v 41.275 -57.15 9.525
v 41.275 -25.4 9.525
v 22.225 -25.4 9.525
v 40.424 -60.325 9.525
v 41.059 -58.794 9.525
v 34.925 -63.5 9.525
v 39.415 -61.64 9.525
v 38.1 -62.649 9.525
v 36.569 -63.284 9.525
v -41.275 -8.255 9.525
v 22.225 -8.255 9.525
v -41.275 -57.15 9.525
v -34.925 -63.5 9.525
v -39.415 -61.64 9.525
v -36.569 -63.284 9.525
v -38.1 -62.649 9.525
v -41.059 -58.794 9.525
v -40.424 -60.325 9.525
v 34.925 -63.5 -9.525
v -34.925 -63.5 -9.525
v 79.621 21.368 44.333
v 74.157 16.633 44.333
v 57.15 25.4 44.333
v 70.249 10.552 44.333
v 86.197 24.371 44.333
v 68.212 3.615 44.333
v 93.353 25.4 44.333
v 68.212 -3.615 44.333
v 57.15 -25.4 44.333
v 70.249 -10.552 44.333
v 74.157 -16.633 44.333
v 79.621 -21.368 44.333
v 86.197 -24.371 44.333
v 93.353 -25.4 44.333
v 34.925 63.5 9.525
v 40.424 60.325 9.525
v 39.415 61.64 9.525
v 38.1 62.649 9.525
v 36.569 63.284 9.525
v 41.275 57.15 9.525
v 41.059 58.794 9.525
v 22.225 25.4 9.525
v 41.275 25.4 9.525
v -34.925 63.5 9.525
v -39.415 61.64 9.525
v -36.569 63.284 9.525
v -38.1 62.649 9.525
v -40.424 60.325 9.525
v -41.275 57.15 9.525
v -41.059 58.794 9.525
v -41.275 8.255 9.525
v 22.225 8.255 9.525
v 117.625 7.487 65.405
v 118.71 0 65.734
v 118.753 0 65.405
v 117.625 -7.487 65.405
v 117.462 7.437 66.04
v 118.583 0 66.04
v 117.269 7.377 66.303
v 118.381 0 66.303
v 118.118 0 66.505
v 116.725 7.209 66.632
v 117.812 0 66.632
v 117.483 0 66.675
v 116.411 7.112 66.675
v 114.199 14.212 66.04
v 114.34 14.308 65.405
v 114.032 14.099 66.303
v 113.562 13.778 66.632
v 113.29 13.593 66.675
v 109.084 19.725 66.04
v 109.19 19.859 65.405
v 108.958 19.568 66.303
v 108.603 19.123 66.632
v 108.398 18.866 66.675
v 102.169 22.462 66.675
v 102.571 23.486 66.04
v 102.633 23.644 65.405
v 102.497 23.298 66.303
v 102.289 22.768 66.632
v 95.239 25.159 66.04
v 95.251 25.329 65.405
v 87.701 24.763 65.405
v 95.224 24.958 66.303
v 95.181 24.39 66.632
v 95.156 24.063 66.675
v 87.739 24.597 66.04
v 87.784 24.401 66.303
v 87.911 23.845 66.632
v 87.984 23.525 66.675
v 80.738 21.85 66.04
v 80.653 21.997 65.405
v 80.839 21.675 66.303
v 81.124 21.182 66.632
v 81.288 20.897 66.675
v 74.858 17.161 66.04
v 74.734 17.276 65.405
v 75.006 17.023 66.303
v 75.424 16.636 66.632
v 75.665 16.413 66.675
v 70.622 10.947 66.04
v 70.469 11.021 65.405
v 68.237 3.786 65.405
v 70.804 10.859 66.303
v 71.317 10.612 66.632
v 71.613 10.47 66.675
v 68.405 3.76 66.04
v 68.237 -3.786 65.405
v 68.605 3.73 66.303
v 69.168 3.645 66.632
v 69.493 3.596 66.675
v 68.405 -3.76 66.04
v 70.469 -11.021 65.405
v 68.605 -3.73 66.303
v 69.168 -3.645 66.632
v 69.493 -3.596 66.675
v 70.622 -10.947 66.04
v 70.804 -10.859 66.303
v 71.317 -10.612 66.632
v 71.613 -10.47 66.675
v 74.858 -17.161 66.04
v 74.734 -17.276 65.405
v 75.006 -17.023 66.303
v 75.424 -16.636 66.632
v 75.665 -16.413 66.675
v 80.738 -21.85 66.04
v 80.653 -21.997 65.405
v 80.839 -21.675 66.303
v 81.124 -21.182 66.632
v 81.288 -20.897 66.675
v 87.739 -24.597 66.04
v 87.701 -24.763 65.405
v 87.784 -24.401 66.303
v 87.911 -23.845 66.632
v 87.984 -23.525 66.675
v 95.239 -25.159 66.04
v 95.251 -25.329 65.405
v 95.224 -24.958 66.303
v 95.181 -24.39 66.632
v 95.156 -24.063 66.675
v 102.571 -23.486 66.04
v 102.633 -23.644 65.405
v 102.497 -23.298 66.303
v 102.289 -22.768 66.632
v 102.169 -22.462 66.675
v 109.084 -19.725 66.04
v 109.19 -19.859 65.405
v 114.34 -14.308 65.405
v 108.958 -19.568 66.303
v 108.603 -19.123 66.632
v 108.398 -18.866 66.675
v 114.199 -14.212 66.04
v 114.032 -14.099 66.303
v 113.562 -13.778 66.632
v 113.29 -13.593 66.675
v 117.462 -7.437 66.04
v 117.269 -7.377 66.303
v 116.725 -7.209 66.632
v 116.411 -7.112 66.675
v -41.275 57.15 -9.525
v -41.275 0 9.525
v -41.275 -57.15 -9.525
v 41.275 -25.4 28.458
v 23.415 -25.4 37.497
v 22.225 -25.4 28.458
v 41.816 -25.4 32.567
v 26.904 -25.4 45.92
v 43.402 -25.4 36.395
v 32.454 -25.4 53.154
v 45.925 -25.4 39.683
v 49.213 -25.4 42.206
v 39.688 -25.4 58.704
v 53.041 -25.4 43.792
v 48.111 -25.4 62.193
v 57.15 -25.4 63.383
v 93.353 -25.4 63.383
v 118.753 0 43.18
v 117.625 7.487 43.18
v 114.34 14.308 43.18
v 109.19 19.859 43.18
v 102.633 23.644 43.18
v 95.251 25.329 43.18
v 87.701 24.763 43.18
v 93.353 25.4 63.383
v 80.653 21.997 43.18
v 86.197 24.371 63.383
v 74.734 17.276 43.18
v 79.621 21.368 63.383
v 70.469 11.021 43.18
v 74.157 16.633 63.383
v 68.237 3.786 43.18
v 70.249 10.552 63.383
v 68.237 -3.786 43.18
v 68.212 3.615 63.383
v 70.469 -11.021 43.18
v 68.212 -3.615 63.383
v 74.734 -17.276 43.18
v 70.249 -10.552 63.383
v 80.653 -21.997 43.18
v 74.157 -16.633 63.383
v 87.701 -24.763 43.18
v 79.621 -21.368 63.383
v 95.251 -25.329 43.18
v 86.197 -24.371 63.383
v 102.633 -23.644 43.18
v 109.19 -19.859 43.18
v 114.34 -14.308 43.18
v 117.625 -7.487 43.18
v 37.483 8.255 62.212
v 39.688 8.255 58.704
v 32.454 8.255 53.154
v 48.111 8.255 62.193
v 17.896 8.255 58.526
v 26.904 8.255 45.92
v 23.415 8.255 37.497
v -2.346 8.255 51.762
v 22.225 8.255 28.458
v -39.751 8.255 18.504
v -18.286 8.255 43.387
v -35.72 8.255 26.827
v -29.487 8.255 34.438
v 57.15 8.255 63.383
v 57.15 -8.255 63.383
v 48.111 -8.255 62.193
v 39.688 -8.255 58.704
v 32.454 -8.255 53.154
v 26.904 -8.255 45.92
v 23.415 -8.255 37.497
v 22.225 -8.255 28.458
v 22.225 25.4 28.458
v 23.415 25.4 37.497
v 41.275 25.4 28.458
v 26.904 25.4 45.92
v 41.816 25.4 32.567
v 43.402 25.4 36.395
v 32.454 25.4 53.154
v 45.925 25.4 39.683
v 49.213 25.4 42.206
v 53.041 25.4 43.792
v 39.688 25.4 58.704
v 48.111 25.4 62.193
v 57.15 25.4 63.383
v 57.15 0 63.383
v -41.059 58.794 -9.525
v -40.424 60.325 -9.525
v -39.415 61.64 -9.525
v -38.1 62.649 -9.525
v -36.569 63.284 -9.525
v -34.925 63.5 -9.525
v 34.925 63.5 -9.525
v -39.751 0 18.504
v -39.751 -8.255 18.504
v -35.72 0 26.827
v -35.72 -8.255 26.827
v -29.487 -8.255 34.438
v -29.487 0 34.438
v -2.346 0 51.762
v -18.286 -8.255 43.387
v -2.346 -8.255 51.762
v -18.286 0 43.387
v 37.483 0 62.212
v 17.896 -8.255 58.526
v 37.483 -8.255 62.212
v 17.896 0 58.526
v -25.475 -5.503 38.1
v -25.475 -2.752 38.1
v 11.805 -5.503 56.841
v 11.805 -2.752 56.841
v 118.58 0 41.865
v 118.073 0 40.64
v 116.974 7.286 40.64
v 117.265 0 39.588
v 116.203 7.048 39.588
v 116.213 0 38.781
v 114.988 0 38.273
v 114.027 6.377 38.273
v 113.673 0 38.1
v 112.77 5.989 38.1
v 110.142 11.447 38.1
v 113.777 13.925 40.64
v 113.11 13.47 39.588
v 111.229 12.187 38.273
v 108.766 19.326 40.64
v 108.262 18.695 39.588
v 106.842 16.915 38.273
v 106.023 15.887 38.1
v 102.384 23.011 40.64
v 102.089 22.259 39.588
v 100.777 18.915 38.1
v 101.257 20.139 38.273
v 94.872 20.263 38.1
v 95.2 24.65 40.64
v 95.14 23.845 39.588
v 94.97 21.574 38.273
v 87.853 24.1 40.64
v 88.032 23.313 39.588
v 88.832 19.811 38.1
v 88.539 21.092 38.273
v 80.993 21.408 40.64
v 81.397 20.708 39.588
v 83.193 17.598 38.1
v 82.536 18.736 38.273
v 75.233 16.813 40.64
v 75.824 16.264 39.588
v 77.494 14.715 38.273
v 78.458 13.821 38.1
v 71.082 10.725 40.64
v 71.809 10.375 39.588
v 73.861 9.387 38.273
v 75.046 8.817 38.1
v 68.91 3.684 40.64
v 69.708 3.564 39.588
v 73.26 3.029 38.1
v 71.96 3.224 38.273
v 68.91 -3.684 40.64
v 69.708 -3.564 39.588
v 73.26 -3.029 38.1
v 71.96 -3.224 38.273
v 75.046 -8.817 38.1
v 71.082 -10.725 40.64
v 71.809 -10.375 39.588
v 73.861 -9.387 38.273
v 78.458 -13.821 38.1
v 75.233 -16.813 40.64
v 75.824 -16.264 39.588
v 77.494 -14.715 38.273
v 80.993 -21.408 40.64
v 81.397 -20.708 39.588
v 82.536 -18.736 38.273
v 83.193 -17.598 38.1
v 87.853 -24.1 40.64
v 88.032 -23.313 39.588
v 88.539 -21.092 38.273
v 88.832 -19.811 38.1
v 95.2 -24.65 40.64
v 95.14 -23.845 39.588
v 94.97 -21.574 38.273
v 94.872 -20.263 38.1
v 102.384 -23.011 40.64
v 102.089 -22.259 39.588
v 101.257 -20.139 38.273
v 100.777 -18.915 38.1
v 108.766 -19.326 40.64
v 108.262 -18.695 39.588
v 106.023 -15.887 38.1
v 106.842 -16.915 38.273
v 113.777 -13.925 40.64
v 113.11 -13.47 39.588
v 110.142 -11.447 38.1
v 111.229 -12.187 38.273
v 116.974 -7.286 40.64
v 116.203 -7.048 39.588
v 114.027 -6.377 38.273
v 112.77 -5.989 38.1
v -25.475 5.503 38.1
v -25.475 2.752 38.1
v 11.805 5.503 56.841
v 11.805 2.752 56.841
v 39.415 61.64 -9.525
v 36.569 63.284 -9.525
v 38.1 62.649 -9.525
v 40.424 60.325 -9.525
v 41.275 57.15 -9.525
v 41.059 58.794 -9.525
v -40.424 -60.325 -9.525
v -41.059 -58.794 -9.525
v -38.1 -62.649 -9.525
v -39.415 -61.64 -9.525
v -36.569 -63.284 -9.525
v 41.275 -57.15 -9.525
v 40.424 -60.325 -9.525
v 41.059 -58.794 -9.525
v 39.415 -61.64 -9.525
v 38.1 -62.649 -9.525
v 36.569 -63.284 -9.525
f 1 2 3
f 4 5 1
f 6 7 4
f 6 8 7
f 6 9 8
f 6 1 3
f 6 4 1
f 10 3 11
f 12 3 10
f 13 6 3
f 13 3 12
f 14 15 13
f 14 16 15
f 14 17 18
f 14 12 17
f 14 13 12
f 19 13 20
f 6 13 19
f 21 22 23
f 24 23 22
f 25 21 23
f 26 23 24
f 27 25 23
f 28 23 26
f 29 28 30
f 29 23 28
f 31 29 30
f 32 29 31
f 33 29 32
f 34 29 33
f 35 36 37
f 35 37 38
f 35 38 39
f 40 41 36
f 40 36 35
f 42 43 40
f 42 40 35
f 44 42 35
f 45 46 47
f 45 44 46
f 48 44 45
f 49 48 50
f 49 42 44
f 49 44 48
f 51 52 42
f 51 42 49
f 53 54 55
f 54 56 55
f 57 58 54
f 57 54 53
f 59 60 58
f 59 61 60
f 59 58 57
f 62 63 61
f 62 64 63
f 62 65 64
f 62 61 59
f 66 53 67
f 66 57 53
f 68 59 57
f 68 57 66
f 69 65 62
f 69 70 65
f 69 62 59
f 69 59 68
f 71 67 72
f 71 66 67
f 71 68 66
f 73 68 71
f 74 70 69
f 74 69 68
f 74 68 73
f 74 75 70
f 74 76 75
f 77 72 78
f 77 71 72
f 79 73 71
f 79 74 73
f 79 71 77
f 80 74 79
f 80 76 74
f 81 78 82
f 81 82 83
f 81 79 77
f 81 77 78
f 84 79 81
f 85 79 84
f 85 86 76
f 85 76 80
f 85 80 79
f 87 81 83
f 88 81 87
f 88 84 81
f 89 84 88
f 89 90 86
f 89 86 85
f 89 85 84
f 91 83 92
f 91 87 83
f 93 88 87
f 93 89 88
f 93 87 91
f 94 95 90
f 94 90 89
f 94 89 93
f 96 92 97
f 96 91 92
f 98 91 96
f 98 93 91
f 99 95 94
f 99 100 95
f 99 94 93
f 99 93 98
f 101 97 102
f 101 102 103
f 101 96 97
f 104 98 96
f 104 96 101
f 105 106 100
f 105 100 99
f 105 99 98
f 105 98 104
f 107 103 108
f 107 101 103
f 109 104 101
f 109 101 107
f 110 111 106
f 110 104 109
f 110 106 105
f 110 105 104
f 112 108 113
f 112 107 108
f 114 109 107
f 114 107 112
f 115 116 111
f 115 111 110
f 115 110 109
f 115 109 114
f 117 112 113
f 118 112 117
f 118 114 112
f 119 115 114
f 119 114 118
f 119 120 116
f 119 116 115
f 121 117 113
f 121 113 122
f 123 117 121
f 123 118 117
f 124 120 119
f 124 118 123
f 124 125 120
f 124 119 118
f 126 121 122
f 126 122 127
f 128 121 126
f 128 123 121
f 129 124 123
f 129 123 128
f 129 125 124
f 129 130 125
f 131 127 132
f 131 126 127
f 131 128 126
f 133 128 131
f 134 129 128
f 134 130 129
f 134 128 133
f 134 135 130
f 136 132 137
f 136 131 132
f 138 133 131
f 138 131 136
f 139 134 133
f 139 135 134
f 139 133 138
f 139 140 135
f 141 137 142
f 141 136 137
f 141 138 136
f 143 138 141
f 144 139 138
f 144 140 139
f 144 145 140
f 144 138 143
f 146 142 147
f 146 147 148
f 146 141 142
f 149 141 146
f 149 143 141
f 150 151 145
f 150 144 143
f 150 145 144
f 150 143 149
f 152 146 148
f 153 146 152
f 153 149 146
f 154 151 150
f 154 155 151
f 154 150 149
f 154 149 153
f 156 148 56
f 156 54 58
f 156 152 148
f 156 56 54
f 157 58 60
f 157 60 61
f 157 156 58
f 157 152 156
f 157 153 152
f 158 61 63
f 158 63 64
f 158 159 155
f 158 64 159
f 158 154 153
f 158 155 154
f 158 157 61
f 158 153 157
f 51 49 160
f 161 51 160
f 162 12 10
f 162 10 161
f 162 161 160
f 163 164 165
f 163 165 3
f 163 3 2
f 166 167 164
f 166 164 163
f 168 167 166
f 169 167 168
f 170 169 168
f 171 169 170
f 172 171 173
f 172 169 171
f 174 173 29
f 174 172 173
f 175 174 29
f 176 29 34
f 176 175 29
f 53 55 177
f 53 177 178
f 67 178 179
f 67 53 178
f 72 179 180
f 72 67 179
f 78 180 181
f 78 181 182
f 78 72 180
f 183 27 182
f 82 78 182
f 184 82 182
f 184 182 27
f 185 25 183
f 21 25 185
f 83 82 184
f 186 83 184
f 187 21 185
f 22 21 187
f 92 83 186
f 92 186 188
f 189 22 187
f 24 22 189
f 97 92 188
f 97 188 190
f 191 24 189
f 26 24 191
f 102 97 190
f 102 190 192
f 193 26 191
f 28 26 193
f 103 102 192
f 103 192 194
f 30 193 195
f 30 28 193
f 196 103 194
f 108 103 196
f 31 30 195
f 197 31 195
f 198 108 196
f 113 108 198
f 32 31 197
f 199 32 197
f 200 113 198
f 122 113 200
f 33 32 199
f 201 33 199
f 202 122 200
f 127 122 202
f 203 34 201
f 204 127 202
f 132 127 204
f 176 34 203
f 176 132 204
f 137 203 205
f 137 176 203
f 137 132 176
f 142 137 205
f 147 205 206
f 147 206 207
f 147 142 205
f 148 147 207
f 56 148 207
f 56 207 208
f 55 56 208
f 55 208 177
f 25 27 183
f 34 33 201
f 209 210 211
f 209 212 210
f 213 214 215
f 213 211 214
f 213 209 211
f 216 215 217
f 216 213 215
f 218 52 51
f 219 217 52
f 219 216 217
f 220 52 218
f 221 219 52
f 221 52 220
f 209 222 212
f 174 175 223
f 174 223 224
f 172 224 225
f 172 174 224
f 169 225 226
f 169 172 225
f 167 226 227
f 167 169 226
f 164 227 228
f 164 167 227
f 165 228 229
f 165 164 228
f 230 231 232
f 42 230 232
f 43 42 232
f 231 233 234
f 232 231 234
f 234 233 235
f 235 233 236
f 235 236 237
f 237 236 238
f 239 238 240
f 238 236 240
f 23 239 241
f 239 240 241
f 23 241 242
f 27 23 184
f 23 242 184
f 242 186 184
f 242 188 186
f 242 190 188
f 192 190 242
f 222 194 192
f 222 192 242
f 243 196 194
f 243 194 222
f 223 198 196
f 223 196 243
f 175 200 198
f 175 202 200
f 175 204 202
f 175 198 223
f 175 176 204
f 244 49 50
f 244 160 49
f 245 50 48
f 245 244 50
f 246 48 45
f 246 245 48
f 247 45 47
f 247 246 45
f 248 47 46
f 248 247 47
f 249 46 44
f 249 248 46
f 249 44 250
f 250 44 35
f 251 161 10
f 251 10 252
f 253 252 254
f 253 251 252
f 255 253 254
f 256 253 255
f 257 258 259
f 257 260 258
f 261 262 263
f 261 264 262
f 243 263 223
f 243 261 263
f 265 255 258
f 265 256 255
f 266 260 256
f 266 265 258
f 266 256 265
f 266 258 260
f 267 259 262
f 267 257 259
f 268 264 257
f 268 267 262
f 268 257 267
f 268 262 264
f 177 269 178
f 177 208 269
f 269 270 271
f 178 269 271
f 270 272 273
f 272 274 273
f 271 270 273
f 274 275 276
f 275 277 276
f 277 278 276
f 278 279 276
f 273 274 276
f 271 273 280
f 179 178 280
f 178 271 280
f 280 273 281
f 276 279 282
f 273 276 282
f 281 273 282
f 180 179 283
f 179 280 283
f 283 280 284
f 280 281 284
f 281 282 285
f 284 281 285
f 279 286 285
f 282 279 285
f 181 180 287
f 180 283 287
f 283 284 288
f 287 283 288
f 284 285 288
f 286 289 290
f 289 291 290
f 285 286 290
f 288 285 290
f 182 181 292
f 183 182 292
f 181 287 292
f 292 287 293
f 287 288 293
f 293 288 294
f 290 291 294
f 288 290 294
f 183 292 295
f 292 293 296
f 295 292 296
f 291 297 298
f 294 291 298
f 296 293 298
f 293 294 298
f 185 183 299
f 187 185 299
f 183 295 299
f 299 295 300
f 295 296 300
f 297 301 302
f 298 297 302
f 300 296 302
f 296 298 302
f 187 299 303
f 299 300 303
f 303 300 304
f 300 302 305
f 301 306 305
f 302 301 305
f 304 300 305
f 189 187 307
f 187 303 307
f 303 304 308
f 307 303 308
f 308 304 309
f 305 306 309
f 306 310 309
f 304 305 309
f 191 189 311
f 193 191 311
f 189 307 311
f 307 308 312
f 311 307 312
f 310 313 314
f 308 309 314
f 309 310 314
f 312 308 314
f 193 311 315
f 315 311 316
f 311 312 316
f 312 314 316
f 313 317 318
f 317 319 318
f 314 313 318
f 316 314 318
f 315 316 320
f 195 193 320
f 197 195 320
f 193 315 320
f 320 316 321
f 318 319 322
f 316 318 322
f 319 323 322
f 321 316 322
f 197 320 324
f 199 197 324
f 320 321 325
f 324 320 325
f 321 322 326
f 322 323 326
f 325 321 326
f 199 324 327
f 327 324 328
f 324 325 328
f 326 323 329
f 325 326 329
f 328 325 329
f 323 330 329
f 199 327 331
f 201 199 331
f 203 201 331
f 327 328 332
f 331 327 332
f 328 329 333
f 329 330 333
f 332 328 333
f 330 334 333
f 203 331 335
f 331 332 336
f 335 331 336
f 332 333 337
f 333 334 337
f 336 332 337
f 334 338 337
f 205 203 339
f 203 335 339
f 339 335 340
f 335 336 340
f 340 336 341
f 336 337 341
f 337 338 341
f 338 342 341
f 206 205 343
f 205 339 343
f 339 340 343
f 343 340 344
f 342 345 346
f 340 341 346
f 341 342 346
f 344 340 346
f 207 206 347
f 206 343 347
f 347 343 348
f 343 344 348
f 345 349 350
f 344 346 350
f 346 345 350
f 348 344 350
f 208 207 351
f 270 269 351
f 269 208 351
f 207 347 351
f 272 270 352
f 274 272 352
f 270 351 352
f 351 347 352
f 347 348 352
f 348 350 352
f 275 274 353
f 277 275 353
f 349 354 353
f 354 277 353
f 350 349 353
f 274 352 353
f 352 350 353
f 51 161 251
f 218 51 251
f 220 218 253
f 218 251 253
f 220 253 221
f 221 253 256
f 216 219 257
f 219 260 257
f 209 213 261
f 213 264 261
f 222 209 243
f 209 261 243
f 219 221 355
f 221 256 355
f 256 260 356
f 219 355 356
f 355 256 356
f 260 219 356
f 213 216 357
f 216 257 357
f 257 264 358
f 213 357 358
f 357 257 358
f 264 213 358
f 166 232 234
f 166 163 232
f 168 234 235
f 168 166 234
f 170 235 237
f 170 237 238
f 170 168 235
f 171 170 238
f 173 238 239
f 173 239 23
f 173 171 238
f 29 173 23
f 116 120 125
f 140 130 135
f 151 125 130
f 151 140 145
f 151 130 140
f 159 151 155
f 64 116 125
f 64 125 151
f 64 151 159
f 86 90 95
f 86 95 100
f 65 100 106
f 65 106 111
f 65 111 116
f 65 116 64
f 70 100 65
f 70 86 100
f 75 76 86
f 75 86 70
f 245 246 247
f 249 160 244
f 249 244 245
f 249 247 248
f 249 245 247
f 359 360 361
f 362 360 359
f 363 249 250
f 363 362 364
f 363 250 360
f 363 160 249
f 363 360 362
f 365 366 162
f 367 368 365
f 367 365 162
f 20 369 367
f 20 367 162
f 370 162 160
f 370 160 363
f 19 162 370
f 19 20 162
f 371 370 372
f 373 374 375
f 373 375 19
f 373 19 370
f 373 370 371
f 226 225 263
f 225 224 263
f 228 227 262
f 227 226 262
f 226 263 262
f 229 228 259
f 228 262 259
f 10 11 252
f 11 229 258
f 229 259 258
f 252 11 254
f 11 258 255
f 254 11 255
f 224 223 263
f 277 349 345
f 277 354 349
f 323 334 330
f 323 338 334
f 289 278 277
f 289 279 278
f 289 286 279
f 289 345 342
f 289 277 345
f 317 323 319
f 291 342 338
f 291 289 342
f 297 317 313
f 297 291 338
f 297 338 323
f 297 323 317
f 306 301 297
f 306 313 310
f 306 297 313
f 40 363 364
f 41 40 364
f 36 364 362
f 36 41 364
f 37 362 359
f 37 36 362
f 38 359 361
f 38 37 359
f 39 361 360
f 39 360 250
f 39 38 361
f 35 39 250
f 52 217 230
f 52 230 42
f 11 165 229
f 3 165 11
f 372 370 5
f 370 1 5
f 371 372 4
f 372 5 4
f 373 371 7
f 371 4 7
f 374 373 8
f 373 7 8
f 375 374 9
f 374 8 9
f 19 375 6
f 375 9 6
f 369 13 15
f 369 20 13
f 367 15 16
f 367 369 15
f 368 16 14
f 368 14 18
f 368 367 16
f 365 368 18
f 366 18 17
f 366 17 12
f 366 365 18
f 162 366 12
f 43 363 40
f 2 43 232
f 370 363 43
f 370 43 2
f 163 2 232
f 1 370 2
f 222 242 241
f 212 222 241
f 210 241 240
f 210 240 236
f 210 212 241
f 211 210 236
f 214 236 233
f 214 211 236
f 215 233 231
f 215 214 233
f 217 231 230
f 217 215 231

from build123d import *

# Parameters (mm, degrees)
F1_DEPTH = 63.5
F0_W     = 25.4
F0_H     = 19.05
F2_DEPTH = 25.4
F3_DEPTH = 8.255
F5_R     = 6.35
F6_R     = 1.27
F7_R     = 5.08


with BuildPart() as f1:
    # F0 (on Front) → F1 (new body, symmetric)
    with BuildSketch(Plane.XZ):
        Polygon((22.225, 9.525), (-41.275, 9.525), (-41.275, -9.525), (41.275, -9.525), (41.275, 9.525), align=None)
    extrude(amount=F1_DEPTH, both=True)

    # F0 (on Front) → F2 (join, symmetric)
    with BuildSketch(Plane.XZ):
        with Locations((80.6532034516, 53.8579252303)):
            Rectangle(F0_W, F0_H)
        with BuildLine():
            Line((22.225, 28.4579252303), (22.225, 9.525))
            Line((22.225, 9.525), (41.275, 9.525))
            Line((41.275, 9.525), (41.275, 28.4579252303))
            ThreePointArc((41.275, 28.4579252303), (45.9246798487, 39.6832453816), (57.15, 44.3329252303))
            Line((57.15, 44.3329252303), (67.9532034516, 44.3329252303))
            Line((67.9532034516, 44.3329252303), (67.9532034516, 63.3829252303))
            Line((67.9532034516, 63.3829252303), (57.15, 63.3829252303))
            ThreePointArc((57.15, 63.3829252303), (32.4542956671, 53.1536295632), (22.225, 28.4579252303))
        make_face()
    extrude(amount=F2_DEPTH, both=True)

    # F0 (on Front) → F3 (join, symmetric)
    with BuildSketch(Plane.XZ):
        with BuildLine():
            add(Edge.make_bspline(
                [(-41.275, 9.525), (-40.6863895337, 42.2286015016), (12.2434897348, 63.7291564518), (57.15, 63.3829252303)],
                knots=[0, 0, 0, 0, 112.1969551062, 112.1969551062, 112.1969551062, 112.1969551062], degree=3))
            Line((-41.275, 9.525), (22.225, 9.525))
            Line((22.225, 9.525), (22.225, 28.4579252303))
            ThreePointArc((22.225, 28.4579252303), (32.4542956671, 53.1536295632), (57.15, 63.3829252303))
        make_face()
    extrude(amount=F3_DEPTH, both=True)

    # F0 (on Front) → F4 (revolve)
    with BuildSketch(Plane.XZ):
        Polygon((93.3532034516, 66.675), (93.3532034516, 63.3829252303), (93.3532034516, 44.3329252303), (93.3532034516, 38.1), (118.7532034516, 38.1), (118.7532034516, 66.675), align=None)
    revolve(axis=Axis((93.3532034516, 0, 52.3875), (0, 0, 1)))

    # F5
    f5_edges = [f1.edges().sort_by_distance(p)[0] for p in [
        (41.275, -63.5, 0),
        (-41.275, -63.5, 0),
        (-41.275, 63.5, 0),
        (41.275, 63.5, 0),
    ]]
    fillet(f5_edges, radius=F5_R)

    # F6
    f6_edges = [f1.edges().sort_by_distance(p)[0] for p in [
        (67.953203, 0, 66.675),
    ]]
    fillet(f6_edges, radius=F6_R)

    # F7
    f7_edges = [f1.edges().sort_by_distance(p)[0] for p in [
        (67.953203, 0, 38.1),
    ]]
    fillet(f7_edges, radius=F7_R)


solid = f1.part
